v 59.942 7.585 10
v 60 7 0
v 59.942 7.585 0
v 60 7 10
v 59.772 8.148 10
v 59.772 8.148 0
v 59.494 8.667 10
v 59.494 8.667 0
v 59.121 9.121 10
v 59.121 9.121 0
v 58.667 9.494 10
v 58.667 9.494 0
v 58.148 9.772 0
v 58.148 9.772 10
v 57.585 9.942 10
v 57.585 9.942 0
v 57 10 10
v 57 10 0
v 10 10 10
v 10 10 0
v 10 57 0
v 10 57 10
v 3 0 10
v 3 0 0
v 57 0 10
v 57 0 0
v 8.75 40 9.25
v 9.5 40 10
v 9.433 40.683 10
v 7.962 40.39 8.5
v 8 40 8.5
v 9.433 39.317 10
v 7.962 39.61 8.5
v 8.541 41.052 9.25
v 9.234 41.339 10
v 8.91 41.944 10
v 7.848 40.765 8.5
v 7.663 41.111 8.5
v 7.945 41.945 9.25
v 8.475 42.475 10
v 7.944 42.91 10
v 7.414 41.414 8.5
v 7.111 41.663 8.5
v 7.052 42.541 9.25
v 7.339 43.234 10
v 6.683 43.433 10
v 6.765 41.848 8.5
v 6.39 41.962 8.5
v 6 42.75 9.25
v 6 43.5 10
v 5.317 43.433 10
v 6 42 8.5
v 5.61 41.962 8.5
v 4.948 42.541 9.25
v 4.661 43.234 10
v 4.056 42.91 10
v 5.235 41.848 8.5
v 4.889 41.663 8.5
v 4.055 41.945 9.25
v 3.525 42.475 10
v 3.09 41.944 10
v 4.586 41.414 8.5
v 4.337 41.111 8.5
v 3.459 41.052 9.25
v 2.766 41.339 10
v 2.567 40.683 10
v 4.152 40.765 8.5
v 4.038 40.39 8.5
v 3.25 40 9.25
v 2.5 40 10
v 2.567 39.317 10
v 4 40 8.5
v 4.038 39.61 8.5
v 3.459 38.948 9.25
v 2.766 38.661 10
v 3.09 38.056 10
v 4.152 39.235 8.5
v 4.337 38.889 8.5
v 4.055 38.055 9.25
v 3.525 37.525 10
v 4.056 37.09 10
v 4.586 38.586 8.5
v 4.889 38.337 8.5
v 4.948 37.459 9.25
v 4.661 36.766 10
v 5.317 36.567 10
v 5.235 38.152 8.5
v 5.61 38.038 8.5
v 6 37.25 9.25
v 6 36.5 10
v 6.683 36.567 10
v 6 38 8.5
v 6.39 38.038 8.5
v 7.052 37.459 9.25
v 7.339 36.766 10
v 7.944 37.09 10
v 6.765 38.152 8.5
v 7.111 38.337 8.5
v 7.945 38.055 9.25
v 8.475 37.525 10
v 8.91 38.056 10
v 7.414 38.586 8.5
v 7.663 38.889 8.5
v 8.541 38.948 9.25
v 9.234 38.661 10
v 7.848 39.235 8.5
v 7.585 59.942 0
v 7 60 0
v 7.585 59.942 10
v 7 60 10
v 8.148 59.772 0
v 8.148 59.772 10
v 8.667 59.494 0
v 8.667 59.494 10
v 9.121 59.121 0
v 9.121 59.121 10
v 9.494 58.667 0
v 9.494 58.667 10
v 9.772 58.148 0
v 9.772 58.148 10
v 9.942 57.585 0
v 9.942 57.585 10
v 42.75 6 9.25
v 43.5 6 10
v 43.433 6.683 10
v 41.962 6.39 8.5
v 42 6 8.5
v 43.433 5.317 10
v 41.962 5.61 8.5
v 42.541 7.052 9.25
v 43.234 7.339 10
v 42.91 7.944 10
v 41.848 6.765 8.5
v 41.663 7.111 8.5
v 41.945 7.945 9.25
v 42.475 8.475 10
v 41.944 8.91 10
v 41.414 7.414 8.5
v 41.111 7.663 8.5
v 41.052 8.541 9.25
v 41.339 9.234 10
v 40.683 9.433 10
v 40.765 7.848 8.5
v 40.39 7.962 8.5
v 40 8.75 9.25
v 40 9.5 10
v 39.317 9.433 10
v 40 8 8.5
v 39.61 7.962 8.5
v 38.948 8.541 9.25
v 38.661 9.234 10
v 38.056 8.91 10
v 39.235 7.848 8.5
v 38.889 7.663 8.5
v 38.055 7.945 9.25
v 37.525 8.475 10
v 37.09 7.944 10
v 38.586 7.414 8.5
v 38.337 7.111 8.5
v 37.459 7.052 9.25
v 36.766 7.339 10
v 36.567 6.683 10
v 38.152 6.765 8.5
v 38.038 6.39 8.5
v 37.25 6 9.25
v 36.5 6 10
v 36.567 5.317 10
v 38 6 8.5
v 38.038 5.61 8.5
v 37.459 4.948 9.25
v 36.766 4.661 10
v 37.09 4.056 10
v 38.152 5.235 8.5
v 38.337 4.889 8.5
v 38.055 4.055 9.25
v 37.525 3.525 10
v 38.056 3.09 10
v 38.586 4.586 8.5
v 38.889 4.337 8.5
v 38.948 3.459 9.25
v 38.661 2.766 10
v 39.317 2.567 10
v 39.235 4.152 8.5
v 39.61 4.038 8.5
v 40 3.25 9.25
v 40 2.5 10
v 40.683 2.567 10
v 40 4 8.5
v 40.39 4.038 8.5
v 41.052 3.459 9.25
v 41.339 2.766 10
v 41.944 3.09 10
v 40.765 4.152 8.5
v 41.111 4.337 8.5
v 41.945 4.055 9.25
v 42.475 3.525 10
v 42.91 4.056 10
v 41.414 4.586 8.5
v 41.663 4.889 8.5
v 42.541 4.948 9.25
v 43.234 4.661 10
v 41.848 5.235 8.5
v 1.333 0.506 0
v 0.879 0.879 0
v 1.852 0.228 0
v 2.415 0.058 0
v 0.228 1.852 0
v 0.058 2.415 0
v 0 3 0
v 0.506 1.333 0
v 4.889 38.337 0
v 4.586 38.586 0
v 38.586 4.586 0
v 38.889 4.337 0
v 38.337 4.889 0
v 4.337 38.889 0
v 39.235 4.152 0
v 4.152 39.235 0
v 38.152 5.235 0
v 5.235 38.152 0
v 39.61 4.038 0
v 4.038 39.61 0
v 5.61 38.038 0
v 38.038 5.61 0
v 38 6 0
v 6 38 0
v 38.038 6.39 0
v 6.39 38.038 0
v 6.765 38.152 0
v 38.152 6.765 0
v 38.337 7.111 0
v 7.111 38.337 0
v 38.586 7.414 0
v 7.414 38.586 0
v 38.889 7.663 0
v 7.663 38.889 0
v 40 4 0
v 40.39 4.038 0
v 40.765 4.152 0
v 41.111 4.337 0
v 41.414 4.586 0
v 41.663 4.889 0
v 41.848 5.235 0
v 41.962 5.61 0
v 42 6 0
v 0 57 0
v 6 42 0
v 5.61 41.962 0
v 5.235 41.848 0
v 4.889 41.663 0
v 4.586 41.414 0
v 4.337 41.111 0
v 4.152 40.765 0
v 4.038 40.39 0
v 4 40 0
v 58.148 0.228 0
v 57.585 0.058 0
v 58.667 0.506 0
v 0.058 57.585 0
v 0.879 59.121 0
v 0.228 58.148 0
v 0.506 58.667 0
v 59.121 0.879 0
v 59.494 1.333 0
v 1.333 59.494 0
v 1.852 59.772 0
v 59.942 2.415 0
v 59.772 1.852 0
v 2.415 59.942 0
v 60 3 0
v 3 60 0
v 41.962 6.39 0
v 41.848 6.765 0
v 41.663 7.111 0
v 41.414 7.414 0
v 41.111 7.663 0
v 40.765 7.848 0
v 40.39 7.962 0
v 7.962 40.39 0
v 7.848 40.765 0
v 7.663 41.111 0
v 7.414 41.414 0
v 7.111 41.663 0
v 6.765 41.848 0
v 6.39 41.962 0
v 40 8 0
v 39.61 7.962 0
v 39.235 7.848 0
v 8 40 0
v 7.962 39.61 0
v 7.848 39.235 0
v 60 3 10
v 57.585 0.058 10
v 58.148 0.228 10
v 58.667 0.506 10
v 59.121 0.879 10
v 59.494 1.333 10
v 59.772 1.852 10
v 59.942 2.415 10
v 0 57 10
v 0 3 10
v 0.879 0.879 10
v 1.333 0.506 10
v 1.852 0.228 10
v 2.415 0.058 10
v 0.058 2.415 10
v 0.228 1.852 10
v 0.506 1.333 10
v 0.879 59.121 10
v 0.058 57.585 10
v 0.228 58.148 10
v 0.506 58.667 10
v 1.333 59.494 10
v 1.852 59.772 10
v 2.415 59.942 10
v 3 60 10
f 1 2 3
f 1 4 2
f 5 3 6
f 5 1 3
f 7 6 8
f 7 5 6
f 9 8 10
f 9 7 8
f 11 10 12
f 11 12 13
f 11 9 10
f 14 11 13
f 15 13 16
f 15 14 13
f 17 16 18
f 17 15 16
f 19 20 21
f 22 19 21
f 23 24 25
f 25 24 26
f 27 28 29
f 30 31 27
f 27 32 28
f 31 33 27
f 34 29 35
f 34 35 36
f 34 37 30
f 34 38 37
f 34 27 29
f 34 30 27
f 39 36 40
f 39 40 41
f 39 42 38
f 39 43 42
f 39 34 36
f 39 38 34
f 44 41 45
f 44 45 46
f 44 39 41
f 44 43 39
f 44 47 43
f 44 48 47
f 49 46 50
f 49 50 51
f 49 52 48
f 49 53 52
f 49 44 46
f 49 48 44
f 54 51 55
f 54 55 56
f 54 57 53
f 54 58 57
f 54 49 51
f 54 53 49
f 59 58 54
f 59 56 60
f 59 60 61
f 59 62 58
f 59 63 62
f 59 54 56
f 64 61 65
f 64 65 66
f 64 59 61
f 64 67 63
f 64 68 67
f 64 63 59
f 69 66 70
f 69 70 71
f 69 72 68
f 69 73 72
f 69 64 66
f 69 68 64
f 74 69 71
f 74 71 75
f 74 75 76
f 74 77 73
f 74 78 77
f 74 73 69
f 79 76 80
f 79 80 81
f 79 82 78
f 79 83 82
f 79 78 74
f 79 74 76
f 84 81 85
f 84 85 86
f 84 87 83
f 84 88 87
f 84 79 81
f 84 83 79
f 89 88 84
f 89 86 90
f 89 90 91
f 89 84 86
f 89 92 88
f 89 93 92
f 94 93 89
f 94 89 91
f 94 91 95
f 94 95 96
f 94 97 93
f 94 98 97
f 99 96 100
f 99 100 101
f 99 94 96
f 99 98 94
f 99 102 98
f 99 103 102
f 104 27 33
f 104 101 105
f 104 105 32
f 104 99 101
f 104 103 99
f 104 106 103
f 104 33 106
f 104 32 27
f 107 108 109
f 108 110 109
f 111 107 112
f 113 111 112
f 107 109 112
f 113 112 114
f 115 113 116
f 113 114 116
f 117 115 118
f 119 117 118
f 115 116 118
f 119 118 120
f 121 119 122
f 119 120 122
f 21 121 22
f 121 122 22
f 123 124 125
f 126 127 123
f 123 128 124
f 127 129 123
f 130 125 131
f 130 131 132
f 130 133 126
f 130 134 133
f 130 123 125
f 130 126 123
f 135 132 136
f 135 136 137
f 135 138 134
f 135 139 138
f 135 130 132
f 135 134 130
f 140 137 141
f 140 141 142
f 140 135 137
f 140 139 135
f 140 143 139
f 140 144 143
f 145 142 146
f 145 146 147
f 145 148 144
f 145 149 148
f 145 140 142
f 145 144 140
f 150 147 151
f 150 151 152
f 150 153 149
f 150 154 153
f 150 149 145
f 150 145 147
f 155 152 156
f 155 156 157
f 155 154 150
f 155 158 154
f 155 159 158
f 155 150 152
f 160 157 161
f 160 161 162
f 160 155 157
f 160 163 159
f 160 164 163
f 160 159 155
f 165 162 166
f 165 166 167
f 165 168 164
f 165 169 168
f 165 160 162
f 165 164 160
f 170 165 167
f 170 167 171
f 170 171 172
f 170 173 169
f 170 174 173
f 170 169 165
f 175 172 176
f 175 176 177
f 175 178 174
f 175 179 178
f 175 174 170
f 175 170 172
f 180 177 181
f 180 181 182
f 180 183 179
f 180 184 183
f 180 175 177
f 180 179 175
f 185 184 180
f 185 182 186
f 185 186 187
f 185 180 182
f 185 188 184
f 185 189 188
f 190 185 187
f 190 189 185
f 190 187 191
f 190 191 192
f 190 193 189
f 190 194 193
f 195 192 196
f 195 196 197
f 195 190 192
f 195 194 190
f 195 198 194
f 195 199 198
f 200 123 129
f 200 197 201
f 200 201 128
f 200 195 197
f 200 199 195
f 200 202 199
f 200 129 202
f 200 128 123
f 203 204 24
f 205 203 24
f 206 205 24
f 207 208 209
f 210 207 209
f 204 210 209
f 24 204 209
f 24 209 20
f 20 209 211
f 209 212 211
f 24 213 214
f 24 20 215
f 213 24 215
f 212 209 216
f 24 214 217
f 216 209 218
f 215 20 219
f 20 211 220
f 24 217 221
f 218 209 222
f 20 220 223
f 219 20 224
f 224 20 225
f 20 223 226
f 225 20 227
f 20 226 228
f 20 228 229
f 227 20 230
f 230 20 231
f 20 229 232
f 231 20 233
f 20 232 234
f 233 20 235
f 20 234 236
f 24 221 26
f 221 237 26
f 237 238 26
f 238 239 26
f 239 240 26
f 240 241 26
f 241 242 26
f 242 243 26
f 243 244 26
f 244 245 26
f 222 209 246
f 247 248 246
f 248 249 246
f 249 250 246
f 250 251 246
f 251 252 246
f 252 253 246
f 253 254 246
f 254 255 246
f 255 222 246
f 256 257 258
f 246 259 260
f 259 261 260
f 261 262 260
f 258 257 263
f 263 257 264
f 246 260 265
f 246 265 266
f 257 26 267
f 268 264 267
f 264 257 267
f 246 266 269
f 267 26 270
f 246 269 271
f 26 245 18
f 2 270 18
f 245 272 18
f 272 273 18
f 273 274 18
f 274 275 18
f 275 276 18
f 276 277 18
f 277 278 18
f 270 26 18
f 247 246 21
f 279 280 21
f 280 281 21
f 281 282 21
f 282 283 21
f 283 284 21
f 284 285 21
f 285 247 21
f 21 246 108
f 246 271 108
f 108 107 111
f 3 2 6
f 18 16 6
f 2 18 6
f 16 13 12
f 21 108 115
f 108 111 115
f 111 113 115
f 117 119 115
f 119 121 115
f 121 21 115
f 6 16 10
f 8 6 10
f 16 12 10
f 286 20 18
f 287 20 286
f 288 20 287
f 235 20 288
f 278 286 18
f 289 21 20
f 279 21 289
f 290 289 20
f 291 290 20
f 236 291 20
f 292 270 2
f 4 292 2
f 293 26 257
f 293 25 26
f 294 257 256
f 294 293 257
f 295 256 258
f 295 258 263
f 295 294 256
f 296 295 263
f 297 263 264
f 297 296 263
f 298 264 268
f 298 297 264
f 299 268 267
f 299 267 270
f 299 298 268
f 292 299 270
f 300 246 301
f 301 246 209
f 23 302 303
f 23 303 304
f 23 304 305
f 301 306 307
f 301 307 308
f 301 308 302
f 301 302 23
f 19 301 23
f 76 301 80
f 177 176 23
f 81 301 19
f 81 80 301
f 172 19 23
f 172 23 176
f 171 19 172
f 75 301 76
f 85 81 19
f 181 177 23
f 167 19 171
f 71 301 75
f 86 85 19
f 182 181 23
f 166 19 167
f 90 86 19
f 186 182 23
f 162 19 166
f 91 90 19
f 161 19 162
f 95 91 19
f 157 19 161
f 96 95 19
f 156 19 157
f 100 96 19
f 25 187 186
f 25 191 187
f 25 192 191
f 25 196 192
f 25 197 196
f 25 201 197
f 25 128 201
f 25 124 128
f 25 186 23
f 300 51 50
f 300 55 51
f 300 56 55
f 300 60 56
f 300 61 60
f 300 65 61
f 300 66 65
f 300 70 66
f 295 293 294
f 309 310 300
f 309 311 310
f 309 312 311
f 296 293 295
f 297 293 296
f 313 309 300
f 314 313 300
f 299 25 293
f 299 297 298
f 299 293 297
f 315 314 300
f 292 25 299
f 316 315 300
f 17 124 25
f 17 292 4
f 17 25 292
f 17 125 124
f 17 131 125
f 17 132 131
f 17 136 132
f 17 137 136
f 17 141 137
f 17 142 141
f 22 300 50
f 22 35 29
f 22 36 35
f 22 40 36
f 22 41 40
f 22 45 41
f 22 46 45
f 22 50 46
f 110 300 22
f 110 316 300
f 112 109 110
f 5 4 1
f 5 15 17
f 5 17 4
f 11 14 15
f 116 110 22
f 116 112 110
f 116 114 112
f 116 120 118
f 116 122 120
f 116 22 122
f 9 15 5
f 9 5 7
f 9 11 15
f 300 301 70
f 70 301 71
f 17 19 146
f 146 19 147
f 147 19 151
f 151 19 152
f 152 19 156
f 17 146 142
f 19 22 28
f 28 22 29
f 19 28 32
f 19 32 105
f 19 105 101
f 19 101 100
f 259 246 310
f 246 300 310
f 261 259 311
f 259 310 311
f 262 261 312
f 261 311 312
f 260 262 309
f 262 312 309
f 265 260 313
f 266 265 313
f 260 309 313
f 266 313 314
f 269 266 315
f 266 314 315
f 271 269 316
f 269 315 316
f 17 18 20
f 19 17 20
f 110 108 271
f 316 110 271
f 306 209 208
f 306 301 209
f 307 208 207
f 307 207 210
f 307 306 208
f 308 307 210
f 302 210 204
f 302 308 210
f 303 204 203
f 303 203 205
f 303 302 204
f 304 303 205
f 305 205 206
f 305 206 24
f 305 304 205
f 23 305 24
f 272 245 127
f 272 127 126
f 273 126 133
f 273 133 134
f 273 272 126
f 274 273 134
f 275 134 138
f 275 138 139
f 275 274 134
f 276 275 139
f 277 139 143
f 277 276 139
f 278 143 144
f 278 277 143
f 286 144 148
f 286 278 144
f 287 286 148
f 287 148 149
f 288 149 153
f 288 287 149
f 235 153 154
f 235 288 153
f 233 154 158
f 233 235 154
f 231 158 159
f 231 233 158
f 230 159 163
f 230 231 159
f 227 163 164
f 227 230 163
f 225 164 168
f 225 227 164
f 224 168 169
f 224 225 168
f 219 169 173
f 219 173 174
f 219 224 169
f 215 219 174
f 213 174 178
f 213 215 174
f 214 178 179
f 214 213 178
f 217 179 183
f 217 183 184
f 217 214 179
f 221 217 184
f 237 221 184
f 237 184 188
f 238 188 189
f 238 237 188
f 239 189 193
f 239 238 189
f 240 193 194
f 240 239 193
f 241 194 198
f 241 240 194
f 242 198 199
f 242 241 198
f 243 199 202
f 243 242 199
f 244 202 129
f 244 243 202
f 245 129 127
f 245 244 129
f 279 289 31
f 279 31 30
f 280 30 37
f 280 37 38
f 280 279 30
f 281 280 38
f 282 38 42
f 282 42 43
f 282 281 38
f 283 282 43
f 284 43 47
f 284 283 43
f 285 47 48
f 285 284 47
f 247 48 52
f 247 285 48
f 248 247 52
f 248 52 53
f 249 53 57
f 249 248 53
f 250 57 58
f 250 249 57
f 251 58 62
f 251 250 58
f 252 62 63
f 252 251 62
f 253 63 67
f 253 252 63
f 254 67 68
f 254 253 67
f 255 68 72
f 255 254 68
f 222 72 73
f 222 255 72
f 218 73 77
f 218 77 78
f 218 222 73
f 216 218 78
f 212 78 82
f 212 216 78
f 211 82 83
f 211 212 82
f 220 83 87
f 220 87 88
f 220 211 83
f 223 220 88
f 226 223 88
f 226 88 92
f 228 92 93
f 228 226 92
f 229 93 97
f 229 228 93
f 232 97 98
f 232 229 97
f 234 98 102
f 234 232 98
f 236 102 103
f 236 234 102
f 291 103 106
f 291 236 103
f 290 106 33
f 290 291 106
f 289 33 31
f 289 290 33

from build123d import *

# Parameters (mm, degrees)
F0_R     = 2
F1_DEPTH = 10
F2_R     = 3
F3_SIZE  = 1.5


with BuildPart() as f1:
    # F0 (on Top) → F1 (new body)
    with BuildSketch(Plane.XY):
        Polygon((0, 60), (0, 0), (60, 0), (60, 10), (10, 10), (10, 60), align=None)
        with Locations((40, 6)):
            Circle(F0_R, mode=Mode.SUBTRACT)
        with Locations((6, 40)):
            Circle(F0_R, mode=Mode.SUBTRACT)
    extrude(amount=F1_DEPTH)

    # F2
    f2_edges = [f1.edges().sort_by_distance(p)[0] for p in [
        (0, 0, 5),
        (60, 0, 5),
        (60, 10, 5),
        (10, 60, 5),
        (0, 60, 5),
    ]]
    fillet(f2_edges, radius=F2_R)

    # F3
    f3_edges = [f1.edges().sort_by_distance(p)[0] for p in [
        (4, 40, 10),
        (38, 6, 10),
    ]]
    chamfer(f3_edges, length=F3_SIZE)


solid = f1.part
